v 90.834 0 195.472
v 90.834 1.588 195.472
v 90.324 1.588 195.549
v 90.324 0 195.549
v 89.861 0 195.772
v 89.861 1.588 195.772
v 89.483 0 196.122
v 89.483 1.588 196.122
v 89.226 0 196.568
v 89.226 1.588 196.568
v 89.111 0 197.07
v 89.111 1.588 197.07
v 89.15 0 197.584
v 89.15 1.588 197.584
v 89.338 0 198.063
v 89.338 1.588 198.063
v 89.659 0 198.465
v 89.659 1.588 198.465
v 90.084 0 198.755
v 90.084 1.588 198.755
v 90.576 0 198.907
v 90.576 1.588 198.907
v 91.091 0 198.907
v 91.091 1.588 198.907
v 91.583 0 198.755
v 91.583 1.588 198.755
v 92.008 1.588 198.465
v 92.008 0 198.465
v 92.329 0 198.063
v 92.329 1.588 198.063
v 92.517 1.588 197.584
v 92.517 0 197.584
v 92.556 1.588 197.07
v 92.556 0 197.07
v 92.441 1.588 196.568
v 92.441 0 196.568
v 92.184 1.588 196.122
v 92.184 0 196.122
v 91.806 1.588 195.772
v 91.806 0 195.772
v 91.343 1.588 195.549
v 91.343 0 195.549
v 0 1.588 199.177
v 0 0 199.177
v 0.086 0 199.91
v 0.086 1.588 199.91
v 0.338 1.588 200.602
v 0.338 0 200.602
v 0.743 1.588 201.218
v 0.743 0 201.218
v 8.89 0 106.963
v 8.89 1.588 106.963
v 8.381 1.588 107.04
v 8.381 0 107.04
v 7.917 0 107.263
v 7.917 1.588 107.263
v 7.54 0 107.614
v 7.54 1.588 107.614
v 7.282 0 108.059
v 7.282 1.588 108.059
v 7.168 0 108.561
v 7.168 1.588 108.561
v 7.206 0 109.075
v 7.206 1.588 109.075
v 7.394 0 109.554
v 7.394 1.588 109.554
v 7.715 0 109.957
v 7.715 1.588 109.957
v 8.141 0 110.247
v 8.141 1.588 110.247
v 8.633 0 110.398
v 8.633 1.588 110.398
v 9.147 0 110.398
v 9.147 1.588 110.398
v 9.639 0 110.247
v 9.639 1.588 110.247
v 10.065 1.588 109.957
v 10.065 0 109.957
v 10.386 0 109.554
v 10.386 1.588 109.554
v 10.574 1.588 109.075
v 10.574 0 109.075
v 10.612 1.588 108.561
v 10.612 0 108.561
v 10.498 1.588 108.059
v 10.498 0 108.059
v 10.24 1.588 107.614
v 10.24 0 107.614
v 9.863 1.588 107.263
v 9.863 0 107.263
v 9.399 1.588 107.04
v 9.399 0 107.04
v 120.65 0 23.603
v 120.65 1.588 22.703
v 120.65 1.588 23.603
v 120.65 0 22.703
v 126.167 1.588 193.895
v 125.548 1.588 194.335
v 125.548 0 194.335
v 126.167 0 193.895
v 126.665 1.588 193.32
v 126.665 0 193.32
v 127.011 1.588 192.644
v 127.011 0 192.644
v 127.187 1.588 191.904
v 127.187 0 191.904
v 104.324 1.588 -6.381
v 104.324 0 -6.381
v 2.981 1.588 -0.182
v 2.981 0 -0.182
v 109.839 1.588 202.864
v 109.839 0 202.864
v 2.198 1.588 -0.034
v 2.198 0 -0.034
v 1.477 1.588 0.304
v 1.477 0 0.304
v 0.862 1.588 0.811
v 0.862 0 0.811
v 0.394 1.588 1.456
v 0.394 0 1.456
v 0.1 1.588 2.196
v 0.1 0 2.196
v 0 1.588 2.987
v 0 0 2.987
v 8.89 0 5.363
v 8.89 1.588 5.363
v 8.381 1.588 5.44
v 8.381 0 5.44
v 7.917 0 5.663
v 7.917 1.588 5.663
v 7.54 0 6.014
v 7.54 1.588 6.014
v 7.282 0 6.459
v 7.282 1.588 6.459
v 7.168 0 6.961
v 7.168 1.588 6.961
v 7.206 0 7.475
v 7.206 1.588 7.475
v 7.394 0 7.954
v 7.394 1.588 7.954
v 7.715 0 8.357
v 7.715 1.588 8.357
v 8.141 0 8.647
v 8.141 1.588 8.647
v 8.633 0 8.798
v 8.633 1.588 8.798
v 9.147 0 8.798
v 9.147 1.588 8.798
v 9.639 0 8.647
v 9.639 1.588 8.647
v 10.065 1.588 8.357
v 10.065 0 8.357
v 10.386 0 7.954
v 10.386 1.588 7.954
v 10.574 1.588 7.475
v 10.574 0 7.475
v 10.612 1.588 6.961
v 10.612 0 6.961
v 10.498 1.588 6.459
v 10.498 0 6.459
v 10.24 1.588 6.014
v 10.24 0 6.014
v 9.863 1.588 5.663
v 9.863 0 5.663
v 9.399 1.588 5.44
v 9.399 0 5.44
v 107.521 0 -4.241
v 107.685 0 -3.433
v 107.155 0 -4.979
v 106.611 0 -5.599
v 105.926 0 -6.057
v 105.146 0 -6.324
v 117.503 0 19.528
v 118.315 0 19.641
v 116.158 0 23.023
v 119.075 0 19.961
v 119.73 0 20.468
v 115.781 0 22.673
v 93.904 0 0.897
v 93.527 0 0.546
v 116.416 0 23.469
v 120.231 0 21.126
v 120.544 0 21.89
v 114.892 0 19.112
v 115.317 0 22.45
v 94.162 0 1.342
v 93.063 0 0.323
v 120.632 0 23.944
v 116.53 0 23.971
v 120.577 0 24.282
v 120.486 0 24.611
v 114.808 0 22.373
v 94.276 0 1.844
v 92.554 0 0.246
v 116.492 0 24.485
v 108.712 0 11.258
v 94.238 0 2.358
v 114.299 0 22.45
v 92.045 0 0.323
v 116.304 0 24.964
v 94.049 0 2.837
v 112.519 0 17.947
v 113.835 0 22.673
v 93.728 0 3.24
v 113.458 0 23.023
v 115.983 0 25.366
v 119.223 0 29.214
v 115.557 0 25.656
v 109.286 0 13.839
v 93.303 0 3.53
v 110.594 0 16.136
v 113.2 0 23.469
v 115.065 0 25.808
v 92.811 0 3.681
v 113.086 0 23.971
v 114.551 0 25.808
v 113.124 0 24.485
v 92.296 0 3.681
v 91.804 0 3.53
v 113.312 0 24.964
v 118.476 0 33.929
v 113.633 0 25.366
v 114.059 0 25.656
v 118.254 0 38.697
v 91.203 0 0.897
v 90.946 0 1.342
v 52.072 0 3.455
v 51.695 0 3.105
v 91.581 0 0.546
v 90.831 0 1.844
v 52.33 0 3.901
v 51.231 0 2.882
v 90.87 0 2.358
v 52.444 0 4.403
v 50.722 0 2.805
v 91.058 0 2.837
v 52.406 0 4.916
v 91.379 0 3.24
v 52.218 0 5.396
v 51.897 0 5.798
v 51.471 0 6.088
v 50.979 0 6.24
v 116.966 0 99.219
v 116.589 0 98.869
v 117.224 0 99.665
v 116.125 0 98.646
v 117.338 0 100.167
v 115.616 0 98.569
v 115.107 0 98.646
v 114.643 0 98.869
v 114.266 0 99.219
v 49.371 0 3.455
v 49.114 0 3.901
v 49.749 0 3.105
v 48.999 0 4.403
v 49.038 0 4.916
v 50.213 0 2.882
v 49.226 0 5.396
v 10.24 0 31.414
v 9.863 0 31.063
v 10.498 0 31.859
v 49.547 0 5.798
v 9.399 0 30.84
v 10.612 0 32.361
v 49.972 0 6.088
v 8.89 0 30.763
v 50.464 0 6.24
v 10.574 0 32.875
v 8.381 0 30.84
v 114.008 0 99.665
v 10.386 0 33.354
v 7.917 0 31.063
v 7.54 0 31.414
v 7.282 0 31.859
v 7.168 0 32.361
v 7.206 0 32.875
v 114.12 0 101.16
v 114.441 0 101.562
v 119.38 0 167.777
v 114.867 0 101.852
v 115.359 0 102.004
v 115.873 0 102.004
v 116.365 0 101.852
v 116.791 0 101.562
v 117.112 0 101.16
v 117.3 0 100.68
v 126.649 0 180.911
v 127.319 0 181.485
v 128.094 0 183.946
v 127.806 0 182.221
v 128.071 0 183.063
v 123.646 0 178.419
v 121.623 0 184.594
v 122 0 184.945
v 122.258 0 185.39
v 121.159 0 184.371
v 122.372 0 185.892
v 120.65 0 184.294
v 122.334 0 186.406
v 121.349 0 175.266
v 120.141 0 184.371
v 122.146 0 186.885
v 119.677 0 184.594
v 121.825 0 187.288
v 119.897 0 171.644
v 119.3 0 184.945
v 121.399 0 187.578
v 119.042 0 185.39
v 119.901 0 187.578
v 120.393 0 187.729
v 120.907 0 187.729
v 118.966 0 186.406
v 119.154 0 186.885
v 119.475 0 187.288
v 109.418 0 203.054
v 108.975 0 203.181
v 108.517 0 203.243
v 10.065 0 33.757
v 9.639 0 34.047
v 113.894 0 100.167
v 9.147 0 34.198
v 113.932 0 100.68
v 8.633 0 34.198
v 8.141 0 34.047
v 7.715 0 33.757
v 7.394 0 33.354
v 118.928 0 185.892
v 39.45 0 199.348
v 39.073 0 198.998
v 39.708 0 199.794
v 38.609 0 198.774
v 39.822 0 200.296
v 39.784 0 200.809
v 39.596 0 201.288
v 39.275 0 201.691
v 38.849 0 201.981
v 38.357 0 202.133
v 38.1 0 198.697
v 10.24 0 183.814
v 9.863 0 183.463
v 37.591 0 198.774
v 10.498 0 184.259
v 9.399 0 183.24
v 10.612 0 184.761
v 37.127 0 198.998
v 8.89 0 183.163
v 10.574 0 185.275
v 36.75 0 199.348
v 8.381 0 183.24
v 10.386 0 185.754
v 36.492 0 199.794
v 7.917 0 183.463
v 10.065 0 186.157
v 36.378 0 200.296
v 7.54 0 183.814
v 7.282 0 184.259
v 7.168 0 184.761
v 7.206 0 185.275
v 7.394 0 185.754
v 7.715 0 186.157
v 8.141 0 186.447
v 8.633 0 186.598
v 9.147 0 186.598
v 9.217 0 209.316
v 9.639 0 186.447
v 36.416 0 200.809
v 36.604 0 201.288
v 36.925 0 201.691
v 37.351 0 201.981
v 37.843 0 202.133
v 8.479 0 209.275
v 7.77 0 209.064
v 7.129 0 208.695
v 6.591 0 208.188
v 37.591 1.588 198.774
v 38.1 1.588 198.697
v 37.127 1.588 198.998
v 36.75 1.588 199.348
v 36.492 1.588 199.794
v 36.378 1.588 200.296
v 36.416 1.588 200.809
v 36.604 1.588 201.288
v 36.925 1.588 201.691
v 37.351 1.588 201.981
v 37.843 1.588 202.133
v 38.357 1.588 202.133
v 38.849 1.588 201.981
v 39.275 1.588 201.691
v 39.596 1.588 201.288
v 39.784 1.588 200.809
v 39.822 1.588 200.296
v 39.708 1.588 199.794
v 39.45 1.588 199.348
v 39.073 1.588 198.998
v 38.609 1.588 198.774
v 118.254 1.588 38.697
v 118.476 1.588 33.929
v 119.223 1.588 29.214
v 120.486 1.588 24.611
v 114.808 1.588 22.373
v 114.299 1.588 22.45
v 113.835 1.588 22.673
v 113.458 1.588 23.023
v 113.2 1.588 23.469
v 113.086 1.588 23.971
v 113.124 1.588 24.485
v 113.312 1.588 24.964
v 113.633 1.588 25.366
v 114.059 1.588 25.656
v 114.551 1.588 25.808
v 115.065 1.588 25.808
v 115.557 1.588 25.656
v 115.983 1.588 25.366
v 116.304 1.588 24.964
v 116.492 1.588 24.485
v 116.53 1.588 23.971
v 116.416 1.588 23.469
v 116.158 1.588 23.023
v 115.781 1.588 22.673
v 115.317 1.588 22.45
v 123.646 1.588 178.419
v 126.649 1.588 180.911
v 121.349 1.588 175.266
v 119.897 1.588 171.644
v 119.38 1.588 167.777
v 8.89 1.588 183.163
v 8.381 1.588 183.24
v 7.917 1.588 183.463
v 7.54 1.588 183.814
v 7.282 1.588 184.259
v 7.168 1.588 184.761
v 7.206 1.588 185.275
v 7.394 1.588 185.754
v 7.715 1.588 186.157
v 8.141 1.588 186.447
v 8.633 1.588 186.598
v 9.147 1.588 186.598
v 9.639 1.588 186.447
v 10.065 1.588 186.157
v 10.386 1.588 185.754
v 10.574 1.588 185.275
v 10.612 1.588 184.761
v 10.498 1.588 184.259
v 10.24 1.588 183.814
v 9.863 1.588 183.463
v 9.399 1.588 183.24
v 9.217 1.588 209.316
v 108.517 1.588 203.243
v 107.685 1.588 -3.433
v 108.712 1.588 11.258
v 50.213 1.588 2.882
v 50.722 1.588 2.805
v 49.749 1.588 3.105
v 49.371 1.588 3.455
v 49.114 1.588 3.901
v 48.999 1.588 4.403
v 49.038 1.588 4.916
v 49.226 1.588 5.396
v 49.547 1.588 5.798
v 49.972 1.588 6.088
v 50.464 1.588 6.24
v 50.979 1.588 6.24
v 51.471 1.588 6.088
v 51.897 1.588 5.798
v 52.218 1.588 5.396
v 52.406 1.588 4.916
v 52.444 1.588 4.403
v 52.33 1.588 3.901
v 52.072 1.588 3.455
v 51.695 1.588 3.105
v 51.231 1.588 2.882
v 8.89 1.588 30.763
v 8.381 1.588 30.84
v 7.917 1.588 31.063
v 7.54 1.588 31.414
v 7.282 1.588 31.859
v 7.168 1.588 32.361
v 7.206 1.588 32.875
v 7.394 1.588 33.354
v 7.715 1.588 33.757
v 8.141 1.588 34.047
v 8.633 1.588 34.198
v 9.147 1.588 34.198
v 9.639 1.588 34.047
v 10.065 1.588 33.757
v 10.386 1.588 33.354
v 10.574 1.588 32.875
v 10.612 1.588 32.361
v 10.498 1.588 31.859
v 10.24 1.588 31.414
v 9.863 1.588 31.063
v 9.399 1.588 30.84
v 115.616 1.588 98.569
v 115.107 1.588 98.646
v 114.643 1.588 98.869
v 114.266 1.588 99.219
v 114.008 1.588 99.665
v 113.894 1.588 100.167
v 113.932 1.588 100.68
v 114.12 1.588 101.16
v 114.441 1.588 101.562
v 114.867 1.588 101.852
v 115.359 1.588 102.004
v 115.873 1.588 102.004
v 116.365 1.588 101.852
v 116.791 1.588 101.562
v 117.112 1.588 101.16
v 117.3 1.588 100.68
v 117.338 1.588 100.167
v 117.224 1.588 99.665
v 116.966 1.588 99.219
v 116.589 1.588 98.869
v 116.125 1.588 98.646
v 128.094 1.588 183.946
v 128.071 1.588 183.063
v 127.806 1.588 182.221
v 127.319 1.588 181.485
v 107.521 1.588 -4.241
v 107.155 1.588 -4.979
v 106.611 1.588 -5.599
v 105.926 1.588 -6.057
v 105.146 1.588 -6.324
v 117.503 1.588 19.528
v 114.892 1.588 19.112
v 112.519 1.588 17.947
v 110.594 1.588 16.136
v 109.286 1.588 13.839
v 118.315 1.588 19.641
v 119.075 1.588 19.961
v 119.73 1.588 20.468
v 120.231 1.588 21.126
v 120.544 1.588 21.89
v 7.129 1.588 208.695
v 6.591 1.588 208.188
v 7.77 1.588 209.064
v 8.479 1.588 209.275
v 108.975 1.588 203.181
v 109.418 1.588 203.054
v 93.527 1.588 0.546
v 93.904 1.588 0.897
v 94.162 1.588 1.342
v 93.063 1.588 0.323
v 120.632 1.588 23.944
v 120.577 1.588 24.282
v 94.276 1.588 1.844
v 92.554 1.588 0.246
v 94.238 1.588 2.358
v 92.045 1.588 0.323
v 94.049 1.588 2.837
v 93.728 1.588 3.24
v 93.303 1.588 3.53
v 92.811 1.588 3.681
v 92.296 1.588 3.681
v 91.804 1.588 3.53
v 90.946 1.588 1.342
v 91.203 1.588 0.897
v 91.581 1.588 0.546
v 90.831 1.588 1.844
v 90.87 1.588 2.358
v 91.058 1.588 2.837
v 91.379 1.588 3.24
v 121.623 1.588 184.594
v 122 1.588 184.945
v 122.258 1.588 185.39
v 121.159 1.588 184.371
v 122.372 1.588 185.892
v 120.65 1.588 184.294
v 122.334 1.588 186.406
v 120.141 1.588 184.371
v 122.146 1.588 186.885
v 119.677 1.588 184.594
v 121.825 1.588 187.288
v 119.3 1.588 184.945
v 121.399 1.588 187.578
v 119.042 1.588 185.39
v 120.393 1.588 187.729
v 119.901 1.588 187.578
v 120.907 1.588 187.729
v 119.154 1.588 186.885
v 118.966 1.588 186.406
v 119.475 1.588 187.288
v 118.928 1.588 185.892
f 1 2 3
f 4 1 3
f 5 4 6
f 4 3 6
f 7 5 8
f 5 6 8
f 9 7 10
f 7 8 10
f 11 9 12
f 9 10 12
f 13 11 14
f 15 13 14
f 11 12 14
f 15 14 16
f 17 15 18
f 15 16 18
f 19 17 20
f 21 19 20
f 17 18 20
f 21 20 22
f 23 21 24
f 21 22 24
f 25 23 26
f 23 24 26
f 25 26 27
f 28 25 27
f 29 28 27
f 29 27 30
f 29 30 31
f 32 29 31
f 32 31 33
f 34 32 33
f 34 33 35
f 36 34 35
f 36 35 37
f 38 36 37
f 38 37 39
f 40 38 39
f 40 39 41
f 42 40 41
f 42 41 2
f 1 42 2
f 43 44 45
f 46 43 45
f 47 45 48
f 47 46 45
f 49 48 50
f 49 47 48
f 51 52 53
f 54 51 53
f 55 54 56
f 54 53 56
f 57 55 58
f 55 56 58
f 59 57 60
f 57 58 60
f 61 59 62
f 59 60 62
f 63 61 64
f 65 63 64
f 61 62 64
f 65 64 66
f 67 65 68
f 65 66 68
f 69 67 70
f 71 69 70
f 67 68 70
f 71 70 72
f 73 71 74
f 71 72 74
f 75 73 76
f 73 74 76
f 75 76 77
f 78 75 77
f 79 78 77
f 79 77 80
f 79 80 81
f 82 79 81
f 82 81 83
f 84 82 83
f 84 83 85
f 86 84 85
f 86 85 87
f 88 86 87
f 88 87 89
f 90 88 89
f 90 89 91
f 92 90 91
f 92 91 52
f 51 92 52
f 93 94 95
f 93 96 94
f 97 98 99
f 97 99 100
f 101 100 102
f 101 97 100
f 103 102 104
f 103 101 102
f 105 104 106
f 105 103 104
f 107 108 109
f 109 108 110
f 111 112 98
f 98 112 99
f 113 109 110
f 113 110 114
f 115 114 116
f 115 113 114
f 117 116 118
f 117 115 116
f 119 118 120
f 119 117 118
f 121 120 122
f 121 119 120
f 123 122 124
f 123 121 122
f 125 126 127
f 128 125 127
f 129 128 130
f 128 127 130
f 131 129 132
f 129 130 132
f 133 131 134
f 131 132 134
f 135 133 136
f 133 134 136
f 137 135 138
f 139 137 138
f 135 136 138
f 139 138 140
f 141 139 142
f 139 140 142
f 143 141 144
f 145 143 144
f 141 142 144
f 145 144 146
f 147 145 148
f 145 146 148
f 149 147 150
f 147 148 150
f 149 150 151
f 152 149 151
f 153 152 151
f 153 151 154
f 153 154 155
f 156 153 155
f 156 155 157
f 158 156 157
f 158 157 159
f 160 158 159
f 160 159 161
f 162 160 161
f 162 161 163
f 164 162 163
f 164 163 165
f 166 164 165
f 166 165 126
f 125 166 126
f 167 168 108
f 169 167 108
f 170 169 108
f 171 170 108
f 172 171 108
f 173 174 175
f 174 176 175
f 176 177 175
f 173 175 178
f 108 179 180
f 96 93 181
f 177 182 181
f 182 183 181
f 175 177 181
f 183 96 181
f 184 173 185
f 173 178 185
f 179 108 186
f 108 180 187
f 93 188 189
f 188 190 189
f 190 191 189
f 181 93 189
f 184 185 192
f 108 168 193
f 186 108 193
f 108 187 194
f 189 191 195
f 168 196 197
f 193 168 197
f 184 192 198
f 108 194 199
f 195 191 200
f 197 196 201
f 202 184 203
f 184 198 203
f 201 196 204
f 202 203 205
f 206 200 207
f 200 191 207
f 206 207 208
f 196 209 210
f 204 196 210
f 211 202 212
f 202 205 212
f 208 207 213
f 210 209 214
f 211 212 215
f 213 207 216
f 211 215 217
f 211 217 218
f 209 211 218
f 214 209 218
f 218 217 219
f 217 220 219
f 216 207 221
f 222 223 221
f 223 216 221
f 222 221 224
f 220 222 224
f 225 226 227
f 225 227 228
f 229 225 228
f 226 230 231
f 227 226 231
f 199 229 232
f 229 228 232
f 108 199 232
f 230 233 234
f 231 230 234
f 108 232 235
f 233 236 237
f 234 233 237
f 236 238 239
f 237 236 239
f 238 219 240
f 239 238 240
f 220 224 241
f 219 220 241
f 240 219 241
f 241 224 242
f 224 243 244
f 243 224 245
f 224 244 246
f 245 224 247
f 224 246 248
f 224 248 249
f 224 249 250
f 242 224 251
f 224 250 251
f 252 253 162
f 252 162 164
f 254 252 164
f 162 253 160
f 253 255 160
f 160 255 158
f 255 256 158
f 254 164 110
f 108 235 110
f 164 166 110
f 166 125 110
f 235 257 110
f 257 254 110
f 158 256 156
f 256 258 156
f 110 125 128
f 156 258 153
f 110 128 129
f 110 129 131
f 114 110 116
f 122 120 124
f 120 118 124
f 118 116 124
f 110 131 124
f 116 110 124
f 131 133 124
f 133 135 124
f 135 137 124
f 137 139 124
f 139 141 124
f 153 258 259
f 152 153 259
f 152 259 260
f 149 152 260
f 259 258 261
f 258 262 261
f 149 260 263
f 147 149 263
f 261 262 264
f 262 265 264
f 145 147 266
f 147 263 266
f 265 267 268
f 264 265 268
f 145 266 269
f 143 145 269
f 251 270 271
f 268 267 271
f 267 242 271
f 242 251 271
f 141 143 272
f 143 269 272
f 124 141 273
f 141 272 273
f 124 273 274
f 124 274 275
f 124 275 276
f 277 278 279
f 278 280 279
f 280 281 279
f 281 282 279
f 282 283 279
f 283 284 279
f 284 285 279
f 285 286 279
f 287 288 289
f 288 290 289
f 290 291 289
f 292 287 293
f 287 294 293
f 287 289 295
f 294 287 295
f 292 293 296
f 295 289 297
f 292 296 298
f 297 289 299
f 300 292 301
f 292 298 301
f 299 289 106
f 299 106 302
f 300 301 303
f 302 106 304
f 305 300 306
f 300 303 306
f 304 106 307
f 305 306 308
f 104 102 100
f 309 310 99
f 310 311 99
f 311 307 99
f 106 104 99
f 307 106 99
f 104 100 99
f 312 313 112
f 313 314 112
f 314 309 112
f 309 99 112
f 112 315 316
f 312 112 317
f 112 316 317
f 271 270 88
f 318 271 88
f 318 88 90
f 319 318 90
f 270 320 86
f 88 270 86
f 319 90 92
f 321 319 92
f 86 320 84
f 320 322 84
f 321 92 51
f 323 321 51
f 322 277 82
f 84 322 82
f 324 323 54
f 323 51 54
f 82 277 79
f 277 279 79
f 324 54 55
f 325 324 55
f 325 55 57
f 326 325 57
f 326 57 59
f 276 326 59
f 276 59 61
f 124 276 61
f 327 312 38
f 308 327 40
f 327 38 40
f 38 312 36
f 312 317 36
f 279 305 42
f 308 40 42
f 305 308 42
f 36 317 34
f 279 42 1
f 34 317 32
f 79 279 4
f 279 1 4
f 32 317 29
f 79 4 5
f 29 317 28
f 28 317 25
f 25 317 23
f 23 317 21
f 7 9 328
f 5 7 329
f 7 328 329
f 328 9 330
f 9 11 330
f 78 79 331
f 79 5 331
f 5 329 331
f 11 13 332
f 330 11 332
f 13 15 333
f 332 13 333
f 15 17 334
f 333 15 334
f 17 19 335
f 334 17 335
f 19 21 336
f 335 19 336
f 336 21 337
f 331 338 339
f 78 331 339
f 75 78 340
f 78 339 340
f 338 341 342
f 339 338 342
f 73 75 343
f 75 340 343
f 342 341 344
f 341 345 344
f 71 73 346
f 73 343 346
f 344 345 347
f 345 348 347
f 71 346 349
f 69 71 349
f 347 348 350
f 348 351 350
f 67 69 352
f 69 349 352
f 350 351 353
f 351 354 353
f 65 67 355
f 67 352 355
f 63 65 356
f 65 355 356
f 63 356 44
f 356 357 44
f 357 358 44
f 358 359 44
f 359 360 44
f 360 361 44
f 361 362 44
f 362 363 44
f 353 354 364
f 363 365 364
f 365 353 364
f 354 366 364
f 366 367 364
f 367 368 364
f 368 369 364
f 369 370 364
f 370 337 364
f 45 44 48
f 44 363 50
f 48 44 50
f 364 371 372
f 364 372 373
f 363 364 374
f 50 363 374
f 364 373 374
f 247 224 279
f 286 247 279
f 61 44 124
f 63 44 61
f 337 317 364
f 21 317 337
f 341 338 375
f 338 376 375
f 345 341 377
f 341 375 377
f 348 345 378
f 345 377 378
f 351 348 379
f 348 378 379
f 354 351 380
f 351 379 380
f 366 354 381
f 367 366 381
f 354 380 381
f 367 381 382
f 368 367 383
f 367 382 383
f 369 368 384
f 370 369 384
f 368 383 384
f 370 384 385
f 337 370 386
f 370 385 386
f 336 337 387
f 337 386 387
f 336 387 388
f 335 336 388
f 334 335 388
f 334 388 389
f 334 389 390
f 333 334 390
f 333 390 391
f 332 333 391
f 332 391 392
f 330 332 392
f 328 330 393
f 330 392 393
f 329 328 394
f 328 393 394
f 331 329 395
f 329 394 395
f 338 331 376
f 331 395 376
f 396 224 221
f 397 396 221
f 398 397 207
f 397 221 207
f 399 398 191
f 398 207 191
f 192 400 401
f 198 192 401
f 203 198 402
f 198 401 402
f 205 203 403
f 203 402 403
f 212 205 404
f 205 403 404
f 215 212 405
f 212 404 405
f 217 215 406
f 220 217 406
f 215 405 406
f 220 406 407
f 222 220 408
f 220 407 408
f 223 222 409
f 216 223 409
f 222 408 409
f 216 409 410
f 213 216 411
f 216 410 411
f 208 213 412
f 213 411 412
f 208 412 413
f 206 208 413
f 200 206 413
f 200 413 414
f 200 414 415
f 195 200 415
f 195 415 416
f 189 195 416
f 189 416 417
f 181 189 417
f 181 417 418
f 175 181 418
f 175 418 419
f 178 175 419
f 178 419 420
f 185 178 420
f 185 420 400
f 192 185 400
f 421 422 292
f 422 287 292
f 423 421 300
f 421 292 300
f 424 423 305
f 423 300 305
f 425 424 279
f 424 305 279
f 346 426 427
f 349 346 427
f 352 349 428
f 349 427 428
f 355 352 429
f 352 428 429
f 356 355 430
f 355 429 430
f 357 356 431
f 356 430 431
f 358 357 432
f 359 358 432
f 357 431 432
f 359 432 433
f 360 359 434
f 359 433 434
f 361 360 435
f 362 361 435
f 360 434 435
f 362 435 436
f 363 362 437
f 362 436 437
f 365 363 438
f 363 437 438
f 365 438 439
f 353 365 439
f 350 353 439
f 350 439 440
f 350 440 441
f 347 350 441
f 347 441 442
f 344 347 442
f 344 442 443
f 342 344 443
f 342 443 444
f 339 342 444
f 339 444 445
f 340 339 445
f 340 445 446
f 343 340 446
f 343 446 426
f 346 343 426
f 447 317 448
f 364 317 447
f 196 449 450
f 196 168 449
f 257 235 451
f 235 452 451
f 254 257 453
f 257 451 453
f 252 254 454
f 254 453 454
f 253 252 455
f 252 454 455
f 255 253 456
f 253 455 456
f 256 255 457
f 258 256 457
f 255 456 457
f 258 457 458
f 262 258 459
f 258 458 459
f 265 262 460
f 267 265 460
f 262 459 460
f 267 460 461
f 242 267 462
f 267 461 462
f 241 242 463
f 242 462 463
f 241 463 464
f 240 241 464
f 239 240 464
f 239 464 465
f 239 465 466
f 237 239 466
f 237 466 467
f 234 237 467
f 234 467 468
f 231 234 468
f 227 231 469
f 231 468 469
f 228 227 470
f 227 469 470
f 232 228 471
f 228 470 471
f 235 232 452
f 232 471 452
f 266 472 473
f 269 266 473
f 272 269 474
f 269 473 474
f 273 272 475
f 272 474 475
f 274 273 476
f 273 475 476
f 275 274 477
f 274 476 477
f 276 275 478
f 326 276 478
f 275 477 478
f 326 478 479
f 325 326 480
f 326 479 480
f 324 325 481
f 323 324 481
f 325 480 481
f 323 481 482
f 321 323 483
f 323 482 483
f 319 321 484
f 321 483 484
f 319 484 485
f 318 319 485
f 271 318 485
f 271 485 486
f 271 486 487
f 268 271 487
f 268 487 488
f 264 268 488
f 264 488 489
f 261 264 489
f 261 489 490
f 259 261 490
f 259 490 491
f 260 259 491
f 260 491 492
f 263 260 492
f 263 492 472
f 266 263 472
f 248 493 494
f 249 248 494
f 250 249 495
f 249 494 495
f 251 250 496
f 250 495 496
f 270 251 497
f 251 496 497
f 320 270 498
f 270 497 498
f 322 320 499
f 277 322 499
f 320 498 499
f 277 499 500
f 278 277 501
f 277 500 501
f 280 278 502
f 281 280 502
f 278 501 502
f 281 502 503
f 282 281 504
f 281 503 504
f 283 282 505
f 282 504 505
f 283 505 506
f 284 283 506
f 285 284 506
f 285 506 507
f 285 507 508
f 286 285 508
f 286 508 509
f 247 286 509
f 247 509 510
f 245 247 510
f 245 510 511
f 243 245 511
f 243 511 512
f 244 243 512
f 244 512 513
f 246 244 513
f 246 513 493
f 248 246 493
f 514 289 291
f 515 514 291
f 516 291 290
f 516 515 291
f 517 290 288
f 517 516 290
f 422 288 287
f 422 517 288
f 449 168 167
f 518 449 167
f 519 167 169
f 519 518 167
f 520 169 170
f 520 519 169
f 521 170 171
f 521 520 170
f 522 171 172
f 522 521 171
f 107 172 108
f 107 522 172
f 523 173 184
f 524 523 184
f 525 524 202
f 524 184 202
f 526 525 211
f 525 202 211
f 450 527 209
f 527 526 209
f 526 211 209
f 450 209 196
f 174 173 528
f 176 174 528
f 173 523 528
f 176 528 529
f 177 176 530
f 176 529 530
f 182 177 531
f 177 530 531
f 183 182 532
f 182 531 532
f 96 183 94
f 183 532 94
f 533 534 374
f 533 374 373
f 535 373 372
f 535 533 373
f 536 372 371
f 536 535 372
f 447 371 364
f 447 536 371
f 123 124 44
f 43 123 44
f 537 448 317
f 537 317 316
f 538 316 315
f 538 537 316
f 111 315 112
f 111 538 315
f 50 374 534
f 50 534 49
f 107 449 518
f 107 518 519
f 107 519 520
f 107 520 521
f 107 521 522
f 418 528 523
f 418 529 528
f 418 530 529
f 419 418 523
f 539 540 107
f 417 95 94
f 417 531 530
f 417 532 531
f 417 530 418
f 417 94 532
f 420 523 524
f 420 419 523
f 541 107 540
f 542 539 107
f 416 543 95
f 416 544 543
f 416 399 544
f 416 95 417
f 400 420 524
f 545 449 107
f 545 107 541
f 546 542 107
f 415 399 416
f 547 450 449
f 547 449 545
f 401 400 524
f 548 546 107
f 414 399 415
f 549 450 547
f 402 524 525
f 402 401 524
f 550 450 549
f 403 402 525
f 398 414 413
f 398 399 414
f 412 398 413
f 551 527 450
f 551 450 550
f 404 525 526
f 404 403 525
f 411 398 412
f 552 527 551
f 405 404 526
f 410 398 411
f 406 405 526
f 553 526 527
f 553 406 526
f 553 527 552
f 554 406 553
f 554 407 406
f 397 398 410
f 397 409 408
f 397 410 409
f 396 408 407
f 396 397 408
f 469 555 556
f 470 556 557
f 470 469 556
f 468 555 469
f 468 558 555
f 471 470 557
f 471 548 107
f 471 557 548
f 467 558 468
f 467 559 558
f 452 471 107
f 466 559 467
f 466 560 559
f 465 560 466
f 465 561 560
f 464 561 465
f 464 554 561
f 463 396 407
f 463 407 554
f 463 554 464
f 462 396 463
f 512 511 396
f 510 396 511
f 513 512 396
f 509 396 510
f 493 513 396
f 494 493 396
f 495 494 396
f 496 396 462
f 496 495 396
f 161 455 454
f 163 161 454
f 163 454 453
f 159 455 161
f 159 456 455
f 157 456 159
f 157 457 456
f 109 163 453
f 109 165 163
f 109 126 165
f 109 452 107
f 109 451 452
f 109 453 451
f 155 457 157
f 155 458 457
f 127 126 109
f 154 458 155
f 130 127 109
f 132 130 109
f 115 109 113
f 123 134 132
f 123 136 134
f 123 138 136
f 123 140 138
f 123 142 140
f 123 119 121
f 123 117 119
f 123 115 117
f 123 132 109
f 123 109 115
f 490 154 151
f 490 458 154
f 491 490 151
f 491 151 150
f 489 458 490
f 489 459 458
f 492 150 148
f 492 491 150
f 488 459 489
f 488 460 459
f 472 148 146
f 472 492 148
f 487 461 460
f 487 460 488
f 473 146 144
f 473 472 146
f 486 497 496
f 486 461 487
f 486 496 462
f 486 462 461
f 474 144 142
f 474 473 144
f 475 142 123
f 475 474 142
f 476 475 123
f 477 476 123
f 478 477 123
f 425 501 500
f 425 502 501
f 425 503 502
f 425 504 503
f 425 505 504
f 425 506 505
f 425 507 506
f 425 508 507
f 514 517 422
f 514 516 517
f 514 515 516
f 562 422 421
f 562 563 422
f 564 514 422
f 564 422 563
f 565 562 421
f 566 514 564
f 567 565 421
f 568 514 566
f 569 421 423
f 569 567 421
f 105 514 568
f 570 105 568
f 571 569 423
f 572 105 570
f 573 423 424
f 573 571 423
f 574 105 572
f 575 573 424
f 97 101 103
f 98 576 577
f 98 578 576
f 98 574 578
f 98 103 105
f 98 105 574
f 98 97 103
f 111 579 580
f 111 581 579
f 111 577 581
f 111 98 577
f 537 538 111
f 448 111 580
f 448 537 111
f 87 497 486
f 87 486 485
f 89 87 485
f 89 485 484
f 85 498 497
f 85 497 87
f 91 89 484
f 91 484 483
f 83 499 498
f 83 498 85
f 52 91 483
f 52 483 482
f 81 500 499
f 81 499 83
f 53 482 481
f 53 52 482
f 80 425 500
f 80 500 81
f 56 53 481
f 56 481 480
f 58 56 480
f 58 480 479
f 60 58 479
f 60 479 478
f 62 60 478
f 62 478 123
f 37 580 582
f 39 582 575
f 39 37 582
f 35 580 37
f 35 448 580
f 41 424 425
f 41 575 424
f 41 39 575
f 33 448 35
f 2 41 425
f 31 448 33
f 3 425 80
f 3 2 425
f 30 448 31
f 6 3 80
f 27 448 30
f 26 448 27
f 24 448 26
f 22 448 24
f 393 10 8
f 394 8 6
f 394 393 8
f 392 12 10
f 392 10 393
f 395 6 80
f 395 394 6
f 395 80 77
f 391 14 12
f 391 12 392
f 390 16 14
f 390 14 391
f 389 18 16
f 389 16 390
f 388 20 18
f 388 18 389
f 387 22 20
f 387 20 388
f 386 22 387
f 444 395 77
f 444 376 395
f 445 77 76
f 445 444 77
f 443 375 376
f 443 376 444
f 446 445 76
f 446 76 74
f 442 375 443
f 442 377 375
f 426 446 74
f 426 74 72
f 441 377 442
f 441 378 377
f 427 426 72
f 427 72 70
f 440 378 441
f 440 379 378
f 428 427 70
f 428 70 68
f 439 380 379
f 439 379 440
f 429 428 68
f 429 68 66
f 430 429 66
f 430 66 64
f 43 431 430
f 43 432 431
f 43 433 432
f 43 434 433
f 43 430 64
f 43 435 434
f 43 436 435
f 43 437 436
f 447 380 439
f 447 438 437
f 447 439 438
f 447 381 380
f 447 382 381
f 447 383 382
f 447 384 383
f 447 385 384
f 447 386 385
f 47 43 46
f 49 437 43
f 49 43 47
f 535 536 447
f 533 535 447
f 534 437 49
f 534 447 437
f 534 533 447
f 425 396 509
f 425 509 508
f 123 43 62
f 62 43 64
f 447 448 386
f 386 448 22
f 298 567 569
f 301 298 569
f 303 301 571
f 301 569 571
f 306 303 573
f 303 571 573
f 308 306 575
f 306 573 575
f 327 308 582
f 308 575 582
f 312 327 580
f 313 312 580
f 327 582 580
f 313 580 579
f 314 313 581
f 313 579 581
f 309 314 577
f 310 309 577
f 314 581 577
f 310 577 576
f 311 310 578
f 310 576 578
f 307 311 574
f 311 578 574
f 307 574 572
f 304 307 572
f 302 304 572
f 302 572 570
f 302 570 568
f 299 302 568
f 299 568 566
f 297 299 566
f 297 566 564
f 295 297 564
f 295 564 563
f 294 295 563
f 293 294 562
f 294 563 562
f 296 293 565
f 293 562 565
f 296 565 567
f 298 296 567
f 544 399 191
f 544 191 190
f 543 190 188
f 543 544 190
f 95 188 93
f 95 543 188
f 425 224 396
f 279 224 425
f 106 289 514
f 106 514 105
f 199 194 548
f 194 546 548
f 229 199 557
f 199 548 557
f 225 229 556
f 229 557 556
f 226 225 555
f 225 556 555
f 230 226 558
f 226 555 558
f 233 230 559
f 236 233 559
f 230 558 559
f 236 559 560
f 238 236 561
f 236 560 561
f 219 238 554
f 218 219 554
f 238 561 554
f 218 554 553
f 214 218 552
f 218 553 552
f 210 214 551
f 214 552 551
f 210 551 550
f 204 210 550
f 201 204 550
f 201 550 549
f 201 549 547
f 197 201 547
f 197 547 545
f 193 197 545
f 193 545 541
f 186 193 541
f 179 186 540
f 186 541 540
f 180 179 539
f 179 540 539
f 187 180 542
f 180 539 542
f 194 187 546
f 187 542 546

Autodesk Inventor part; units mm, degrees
ref_plane "YZ Plane" through (0, 0, 0) normal (1, 0, 0) x (0, 1, 0)
ref_plane "XZ Plane" through (0, 0, 0) normal (0, 1, 0) x (-1, 0, 0)
ref_plane "XY Plane" through (0, 0, 0) normal (0, 0, 1) x (1, 0, 0)
sketch "Sketch1" plane through (0, 0, 0) normal (0, 1, 0) x (-1, 0, 0)
  line L0 (-107.4651, -6.5728) -> (-108.712, 11.2585)
  arc A0 (-108.712, 11.2585) -> (-117.5803, 19.5283) centre (-117.5803, 10.6383) ccw
  line L1 (-117.5803, 19.5283) -> (-120.65, 19.5283)
  line L2 (-120.65, 19.5283) -> (-120.65, 24.13)
  arc A1 (-120.65, 24.13) -> (-118.2535, 38.6966) centre (-161.4319, 38.3198) ccw
  line L3 (-128.333, 181.8469) -> (-127, 193.5462)
  line L4 (-109.22, 203.2) -> (-7.62, 209.4141)
  arc A2 (-119.38, 167.7774) -> (-128.333, 181.8469) centre (-135.1274, 167.64) ccw
  line L5 (-107.4651, -6.5728) -> (0, 0)
  line L6 (-7.62, 209.4141) -> (0, 200.333)
  line L7 (0, 0) -> (0, 200.333)
  line L8 (-109.22, 203.2) -> (-127, 193.5462)
  line L9 (-118.2535, 38.6966) -> (-119.38, 167.7774)
  line L10 (0, 0) -> (-88.3844, 0) construction
  line L11 (-8.89, 7.0905) -> (-8.89, 184.8905) construction
  line L12 (-8.89, 7.0905) -> (-92.5537, 1.9734) construction
  line L13 (-114.808, 24.1003) -> (-115.616, 100.296) construction
  line L14 (-114.808, 24.1003) -> (-120.65, 186.0215) construction
  line L15 (32.2864, 0) -> (-193.7183, 0) construction
  line L16 (-38.1, 200.4246) -> (-90.8335, 197.1993) construction
  line L17 (-58.42, 206.3071) -> (-52.8471, 115.1911) construction
  point P0 (-50.7218, 4.532)
  point P1 (-8.89, 108.6905)
  point P2 (-8.89, 32.4905)
  dimension "d52" = 76.2
  dimension "d54" = 76.2
  dimension "d98" = 25
  dimension "d99" = 55
  dimension "d100" = 86.5
  dimension "d103" = 8.89
  dimension "d104" = 7.62
  dimension "d106" = 203.2
  dimension "d108" = 127
  dimension "d109" = 109.22
  dimension "d111" = 167.64
  dimension "d112" = 120.65
  dimension "d114" = 41.91
  dimension "d115" = 41.91
  dimension "d118" = 76.2
  dimension "d122" = 8.89
  dimension "d123" = 86
  dimension "d124" = 43.18
  dimension "d125" = 15.748
  dimension "d127" = 52.832
  dimension "d128" = 7.112
  dimension "d129" = 38.1
  dimension "d130" = 140
  dimension "d131" = 7.62
  dimension "d161" = 25.4
  dimension "d162" = 119.38
  dimension "d163" = 3
  dimension "d166" = 108.712
  dimension "d167" = 114.808
  dimension "d168" = 120.65
  dimension "d170" = 3.175
  dimension "d171" = 26.67
  dimension "d172" = 24.13
  dimension "d174" = 4.572
  dimension "d175" = 193.04
extrude "Plate1" add sketch "Sketch1" along normal blind 1.5875
fillet "Corner Round1" radius 3.175 9 edges at (0, 0.7937, 200.333) (7.62, 0.7937, 209.4141) (120.65, 0.7937, 24.13) (120.65, 0.7937, 19.5283) (107.4651, 0.7937, -6.5728) (127, 0.7937, 193.5462) (109.22, 0.7937, 203.2) (128.333, 0.7937, 181.8469) (0, 0.7937, 0)
hole "Hole1" at (8.89, 0, 184.8905) at (38.1, 0, 200.4246) at (90.8335, 0, 197.1993) at (120.65, 0, 186.0215) at (115.616, 0, 100.296) at (114.808, 0, 24.1003) at (50.7218, 0, 4.532) at (92.5537, 0, 1.9734) at (8.89, 0, 7.0905) at (8.89, 0, 108.6905) at (8.89, 0, 32.4905) direction (0, 1, 0) diameter 3.4544 end through all
equation "\"d60\" = Thickness"
equation "\"d49\" = Thickness"
equation "\"BendReliefWidth\" = Thickness"
equation "\"BendReliefDepth\" = 0.5 * Thickness"
equation "\"CornerReliefSize\" = 4 * Thickness"
equation "\"MinimumRemnant\" = 2 * Thickness"
equation "\"TransitionRadius\" = BendRadius"
equation "\"JacobiRadiusSize\" = BendRadius"
equation "\"GapSize\" = Thickness"
equation "\"Thickness\" = 1.5875"
equation "\"BendRadius\" = 0.762"
properties part number "J009859" material "POLYCARBONATE, CLEAR"
